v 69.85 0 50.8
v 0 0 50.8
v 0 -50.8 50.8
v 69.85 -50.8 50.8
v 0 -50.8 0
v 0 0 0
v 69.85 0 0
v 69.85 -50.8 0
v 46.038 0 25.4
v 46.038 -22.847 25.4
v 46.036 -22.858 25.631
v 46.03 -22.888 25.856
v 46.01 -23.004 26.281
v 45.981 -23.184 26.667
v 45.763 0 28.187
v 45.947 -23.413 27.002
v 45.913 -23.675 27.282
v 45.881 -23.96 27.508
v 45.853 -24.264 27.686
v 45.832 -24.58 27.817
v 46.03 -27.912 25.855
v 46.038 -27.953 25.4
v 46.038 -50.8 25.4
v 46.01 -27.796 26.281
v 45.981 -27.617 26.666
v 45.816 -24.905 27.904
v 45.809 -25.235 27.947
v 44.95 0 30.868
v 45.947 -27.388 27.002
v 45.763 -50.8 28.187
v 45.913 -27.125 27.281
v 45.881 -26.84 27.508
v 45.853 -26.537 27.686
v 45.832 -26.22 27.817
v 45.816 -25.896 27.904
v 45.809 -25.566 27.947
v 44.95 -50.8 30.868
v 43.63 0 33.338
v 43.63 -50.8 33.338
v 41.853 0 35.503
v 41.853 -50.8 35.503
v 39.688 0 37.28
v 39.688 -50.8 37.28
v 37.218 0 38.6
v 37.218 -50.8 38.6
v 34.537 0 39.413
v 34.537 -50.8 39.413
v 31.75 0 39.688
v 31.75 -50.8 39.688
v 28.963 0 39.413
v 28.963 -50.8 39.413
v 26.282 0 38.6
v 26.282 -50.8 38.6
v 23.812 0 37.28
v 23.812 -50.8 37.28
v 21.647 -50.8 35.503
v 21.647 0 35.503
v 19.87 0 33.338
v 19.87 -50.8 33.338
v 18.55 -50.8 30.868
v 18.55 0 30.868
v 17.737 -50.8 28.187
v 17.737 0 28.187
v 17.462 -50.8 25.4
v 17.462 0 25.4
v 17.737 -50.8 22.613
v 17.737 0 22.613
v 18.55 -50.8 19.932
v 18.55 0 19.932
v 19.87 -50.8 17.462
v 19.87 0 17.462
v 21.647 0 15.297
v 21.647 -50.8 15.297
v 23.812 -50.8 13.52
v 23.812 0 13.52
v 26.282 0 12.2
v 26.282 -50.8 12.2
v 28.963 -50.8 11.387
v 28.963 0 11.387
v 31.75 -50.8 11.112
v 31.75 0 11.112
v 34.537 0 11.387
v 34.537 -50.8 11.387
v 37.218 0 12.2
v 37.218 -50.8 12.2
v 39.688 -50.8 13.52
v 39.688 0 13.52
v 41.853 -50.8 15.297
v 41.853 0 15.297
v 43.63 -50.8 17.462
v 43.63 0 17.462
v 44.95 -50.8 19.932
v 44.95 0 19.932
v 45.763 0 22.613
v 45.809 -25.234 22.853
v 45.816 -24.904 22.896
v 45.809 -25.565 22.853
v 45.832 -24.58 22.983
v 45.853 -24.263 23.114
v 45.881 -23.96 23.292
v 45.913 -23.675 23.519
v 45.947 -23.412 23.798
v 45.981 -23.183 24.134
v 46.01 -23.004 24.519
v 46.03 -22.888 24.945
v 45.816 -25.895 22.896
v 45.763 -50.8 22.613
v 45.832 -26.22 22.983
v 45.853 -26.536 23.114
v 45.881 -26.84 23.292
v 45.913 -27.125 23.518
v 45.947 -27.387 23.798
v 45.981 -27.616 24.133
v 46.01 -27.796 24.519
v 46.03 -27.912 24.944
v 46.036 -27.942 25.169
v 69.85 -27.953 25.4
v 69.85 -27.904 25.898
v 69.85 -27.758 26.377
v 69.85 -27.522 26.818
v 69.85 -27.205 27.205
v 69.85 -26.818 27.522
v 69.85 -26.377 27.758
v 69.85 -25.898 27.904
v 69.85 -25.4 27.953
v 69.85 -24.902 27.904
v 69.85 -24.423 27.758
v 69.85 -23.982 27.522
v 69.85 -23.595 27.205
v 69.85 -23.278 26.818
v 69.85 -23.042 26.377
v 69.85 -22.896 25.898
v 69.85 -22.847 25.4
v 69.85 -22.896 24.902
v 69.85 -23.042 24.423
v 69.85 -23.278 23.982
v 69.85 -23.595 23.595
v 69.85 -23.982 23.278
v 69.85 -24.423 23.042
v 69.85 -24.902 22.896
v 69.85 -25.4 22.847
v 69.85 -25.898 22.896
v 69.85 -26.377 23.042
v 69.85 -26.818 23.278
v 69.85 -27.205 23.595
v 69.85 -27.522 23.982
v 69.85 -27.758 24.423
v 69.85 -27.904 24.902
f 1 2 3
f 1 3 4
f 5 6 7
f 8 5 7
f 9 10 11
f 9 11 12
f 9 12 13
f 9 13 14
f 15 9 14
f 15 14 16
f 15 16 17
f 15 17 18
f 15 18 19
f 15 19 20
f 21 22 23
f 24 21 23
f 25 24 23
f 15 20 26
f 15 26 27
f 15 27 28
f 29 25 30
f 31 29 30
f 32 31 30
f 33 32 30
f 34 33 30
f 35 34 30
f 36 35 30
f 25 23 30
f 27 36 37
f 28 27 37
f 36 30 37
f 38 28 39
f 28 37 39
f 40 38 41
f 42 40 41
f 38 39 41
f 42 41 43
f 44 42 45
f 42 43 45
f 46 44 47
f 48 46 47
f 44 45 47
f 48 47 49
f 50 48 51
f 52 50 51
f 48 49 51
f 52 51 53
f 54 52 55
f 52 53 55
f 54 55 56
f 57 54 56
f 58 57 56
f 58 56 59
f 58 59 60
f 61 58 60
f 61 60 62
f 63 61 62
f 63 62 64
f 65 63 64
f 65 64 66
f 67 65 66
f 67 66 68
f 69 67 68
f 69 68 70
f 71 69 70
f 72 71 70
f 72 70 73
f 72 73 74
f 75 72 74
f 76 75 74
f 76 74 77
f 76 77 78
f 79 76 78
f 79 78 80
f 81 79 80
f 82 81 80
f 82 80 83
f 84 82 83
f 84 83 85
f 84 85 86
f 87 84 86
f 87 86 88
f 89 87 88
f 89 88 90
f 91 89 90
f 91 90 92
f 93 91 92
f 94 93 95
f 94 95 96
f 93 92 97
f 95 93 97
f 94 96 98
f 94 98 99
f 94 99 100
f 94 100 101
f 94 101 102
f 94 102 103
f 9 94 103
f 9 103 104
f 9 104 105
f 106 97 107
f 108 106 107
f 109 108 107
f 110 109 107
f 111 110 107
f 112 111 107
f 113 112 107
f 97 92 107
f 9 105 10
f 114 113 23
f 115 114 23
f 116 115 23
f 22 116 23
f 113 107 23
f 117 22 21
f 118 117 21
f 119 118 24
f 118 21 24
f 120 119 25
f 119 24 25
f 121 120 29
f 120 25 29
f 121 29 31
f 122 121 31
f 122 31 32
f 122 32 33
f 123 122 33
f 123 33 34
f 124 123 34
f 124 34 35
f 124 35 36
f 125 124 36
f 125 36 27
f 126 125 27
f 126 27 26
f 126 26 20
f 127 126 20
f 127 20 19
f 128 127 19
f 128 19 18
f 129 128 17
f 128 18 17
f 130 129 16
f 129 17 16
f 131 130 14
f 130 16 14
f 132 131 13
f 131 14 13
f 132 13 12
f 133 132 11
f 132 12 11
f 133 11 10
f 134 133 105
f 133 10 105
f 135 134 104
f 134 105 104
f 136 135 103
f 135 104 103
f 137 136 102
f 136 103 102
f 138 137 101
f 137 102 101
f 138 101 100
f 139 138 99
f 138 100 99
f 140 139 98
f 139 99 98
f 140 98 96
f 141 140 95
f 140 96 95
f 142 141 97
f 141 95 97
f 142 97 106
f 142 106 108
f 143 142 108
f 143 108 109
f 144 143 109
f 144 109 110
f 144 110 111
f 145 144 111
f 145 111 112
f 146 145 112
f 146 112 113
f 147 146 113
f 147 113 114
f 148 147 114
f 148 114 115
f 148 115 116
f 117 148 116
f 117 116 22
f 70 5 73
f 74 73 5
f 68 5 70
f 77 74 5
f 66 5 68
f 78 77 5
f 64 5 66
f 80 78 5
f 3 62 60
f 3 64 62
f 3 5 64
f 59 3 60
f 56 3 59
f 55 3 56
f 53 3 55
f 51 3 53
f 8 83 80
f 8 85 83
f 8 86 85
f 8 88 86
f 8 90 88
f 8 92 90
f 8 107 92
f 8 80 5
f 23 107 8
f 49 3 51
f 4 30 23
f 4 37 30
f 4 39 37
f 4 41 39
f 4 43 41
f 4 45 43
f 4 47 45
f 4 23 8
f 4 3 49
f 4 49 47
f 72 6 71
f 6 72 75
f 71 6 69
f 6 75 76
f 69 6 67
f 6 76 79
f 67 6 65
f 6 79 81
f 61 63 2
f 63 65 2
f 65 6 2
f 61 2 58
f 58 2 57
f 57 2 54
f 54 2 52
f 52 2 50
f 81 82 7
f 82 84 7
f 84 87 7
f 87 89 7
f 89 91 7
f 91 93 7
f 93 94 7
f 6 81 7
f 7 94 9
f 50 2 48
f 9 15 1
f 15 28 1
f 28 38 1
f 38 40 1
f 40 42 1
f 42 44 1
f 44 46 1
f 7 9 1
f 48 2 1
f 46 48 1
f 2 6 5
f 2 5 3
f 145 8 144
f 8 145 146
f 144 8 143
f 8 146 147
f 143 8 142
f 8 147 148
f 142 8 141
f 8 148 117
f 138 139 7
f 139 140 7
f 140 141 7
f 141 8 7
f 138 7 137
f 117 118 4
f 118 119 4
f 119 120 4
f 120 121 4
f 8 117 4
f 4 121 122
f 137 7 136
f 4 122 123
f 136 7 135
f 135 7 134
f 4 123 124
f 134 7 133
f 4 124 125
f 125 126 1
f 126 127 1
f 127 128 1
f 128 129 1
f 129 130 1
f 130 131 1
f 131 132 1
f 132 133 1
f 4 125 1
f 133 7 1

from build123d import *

# Parameters (mm, degrees)
F0_W     = 69.85
F0_H     = 50.8
F1_DEPTH = 50.8
F2_R     = 14.2875
F3_DEPTH = 50.801
F5_D     = 5.1054
F5_DEPTH = 25.4
F5_TIP   = 1.5338169022


with BuildPart() as f1:
    # F0 (on Front) → F1 (new body)
    with BuildSketch(Plane.XZ):
        with Locations((34.925, 25.4)):
            Rectangle(F0_W, F0_H)
    extrude(amount=F1_DEPTH)

    # F2 (on face) → F3 (cut, through all)
    with BuildSketch(Plane.XZ.offset(50.8)):
        with Locations((31.75, 25.4)):
            Circle(F2_R)
    extrude(amount=-F3_DEPTH, mode=Mode.SUBTRACT)

    # F5
    with Locations(Plane.YZ.offset(69.85)):
        with Locations((-25.4, 25.4)):
            Hole(F5_D / 2, depth=F5_DEPTH)
            with Locations((0, 0, -(F5_DEPTH + F5_TIP / 2))):  # 118° drill point
                Cone(0, F5_D / 2, F5_TIP, mode=Mode.SUBTRACT)


solid = f1.part
